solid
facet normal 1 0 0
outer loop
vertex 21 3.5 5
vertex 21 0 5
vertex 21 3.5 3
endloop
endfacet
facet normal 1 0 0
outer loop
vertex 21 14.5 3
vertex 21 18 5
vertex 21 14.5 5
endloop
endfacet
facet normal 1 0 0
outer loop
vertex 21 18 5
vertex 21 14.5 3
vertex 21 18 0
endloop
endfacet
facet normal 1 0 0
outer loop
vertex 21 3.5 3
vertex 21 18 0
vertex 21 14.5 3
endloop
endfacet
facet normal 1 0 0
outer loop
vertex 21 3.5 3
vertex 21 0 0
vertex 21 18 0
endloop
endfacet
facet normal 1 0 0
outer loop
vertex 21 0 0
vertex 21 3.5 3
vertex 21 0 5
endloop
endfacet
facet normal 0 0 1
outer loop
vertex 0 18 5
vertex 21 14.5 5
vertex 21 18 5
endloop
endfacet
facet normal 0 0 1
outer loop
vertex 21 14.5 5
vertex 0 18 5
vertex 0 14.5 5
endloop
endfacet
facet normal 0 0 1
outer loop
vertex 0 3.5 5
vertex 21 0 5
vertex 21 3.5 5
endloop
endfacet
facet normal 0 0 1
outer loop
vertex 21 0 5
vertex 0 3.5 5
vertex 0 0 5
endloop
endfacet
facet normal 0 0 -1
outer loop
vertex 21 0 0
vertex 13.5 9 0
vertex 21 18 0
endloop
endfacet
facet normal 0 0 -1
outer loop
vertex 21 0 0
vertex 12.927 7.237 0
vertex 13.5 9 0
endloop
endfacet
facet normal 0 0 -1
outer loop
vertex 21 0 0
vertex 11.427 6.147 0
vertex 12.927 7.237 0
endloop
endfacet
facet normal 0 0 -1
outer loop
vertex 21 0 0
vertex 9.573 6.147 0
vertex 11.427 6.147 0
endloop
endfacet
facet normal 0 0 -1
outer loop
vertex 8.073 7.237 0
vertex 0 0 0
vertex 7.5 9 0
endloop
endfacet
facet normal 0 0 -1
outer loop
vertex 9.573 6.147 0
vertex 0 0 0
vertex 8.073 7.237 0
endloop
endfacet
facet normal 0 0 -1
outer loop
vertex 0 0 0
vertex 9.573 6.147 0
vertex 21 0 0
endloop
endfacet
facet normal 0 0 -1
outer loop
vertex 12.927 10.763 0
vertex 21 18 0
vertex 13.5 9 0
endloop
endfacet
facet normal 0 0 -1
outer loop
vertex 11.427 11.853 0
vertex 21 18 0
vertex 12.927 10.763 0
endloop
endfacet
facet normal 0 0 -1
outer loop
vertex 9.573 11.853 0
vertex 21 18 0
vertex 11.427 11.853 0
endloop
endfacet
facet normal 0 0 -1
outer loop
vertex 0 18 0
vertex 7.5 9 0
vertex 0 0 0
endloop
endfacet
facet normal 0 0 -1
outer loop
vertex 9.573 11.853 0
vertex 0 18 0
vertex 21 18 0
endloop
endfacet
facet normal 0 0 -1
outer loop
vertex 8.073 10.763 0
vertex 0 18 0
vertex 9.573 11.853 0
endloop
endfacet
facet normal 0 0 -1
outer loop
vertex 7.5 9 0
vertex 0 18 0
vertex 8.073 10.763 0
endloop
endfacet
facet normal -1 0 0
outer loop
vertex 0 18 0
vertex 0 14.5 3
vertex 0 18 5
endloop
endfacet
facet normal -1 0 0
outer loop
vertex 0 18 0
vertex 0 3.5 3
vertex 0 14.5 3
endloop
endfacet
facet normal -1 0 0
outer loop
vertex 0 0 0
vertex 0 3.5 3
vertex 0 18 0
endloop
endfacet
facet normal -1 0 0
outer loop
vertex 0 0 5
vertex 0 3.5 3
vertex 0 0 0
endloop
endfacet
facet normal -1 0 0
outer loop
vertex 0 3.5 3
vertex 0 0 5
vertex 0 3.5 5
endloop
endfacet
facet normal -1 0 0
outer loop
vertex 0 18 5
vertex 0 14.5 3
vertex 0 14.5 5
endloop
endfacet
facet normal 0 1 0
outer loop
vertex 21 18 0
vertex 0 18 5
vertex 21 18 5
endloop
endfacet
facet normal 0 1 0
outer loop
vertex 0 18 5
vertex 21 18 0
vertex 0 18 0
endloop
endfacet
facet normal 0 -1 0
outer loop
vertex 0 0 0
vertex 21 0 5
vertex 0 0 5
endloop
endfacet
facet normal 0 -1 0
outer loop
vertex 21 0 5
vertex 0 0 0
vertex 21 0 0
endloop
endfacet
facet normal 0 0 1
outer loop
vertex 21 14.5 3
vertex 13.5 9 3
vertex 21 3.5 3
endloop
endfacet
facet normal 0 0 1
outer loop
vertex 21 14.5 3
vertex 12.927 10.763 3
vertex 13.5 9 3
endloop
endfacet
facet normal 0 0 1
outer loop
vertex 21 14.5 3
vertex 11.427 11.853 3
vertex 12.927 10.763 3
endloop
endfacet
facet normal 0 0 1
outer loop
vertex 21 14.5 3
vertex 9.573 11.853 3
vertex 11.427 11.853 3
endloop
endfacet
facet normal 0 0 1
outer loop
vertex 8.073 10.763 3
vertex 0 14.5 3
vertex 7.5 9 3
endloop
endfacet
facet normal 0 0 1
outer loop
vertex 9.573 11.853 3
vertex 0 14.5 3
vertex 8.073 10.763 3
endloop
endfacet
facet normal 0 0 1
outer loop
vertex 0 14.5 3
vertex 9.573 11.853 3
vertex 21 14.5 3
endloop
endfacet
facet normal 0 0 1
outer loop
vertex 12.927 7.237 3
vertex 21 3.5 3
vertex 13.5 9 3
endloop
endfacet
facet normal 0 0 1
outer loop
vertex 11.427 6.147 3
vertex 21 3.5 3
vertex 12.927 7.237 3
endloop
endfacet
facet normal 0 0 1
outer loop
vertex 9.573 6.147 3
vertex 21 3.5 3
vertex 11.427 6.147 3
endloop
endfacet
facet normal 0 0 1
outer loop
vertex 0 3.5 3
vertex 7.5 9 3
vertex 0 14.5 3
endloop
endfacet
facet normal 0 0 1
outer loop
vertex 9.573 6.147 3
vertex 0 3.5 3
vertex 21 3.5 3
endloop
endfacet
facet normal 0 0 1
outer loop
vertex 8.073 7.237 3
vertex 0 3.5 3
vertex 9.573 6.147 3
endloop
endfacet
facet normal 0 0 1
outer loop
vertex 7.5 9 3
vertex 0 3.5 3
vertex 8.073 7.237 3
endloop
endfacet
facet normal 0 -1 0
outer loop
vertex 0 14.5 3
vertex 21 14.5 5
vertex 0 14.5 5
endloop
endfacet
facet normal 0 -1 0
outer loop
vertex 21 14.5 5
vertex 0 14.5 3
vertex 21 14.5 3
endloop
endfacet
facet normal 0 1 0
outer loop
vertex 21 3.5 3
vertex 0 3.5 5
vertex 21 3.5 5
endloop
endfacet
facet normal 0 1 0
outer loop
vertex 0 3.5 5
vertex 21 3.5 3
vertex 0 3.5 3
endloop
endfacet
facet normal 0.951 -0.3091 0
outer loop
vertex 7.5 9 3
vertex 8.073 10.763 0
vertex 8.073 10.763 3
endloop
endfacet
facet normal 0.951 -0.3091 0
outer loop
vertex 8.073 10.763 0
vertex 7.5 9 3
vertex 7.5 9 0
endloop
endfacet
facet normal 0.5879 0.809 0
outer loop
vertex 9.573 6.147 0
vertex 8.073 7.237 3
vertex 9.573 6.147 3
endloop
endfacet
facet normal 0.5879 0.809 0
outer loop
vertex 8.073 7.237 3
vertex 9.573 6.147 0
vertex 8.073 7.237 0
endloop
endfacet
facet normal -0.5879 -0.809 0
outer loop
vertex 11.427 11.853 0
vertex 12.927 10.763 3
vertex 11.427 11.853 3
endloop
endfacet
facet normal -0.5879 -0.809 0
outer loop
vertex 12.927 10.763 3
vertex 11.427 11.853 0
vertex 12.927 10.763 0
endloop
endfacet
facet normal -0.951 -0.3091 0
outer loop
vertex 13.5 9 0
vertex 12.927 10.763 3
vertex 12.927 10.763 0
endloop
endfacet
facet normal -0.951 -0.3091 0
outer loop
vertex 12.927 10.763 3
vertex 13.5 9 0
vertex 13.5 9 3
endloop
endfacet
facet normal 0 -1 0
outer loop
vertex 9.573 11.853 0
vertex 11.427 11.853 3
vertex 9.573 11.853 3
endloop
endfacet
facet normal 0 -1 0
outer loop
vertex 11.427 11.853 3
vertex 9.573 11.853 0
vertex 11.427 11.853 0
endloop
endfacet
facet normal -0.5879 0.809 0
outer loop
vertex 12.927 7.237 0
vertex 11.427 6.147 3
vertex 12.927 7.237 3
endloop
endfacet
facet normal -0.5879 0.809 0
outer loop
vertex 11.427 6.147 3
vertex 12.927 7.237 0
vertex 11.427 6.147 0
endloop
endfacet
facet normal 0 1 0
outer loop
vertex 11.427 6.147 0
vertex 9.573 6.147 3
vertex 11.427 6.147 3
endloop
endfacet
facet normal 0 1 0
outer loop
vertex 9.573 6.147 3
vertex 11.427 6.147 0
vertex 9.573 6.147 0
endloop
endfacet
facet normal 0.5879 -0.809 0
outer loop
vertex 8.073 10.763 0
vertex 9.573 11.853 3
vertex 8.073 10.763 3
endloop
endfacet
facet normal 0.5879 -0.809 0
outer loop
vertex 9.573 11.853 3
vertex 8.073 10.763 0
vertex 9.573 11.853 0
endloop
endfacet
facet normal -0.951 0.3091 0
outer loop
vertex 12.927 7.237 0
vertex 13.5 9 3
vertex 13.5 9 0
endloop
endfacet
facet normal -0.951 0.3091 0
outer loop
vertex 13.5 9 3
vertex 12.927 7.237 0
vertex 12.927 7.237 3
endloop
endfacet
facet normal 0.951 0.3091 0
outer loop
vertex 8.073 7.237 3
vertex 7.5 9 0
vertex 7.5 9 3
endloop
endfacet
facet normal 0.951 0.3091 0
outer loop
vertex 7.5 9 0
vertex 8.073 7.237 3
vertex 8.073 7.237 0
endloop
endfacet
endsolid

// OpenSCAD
difference()
{
    cube([21,18,5]);
    
    translate([-1,(18-11)/2,5-2])
        cube([21+2,11,2+1]);
    
    translate([21/2,18/2,-1])
        cylinder(h=5+2,d=6);
}
